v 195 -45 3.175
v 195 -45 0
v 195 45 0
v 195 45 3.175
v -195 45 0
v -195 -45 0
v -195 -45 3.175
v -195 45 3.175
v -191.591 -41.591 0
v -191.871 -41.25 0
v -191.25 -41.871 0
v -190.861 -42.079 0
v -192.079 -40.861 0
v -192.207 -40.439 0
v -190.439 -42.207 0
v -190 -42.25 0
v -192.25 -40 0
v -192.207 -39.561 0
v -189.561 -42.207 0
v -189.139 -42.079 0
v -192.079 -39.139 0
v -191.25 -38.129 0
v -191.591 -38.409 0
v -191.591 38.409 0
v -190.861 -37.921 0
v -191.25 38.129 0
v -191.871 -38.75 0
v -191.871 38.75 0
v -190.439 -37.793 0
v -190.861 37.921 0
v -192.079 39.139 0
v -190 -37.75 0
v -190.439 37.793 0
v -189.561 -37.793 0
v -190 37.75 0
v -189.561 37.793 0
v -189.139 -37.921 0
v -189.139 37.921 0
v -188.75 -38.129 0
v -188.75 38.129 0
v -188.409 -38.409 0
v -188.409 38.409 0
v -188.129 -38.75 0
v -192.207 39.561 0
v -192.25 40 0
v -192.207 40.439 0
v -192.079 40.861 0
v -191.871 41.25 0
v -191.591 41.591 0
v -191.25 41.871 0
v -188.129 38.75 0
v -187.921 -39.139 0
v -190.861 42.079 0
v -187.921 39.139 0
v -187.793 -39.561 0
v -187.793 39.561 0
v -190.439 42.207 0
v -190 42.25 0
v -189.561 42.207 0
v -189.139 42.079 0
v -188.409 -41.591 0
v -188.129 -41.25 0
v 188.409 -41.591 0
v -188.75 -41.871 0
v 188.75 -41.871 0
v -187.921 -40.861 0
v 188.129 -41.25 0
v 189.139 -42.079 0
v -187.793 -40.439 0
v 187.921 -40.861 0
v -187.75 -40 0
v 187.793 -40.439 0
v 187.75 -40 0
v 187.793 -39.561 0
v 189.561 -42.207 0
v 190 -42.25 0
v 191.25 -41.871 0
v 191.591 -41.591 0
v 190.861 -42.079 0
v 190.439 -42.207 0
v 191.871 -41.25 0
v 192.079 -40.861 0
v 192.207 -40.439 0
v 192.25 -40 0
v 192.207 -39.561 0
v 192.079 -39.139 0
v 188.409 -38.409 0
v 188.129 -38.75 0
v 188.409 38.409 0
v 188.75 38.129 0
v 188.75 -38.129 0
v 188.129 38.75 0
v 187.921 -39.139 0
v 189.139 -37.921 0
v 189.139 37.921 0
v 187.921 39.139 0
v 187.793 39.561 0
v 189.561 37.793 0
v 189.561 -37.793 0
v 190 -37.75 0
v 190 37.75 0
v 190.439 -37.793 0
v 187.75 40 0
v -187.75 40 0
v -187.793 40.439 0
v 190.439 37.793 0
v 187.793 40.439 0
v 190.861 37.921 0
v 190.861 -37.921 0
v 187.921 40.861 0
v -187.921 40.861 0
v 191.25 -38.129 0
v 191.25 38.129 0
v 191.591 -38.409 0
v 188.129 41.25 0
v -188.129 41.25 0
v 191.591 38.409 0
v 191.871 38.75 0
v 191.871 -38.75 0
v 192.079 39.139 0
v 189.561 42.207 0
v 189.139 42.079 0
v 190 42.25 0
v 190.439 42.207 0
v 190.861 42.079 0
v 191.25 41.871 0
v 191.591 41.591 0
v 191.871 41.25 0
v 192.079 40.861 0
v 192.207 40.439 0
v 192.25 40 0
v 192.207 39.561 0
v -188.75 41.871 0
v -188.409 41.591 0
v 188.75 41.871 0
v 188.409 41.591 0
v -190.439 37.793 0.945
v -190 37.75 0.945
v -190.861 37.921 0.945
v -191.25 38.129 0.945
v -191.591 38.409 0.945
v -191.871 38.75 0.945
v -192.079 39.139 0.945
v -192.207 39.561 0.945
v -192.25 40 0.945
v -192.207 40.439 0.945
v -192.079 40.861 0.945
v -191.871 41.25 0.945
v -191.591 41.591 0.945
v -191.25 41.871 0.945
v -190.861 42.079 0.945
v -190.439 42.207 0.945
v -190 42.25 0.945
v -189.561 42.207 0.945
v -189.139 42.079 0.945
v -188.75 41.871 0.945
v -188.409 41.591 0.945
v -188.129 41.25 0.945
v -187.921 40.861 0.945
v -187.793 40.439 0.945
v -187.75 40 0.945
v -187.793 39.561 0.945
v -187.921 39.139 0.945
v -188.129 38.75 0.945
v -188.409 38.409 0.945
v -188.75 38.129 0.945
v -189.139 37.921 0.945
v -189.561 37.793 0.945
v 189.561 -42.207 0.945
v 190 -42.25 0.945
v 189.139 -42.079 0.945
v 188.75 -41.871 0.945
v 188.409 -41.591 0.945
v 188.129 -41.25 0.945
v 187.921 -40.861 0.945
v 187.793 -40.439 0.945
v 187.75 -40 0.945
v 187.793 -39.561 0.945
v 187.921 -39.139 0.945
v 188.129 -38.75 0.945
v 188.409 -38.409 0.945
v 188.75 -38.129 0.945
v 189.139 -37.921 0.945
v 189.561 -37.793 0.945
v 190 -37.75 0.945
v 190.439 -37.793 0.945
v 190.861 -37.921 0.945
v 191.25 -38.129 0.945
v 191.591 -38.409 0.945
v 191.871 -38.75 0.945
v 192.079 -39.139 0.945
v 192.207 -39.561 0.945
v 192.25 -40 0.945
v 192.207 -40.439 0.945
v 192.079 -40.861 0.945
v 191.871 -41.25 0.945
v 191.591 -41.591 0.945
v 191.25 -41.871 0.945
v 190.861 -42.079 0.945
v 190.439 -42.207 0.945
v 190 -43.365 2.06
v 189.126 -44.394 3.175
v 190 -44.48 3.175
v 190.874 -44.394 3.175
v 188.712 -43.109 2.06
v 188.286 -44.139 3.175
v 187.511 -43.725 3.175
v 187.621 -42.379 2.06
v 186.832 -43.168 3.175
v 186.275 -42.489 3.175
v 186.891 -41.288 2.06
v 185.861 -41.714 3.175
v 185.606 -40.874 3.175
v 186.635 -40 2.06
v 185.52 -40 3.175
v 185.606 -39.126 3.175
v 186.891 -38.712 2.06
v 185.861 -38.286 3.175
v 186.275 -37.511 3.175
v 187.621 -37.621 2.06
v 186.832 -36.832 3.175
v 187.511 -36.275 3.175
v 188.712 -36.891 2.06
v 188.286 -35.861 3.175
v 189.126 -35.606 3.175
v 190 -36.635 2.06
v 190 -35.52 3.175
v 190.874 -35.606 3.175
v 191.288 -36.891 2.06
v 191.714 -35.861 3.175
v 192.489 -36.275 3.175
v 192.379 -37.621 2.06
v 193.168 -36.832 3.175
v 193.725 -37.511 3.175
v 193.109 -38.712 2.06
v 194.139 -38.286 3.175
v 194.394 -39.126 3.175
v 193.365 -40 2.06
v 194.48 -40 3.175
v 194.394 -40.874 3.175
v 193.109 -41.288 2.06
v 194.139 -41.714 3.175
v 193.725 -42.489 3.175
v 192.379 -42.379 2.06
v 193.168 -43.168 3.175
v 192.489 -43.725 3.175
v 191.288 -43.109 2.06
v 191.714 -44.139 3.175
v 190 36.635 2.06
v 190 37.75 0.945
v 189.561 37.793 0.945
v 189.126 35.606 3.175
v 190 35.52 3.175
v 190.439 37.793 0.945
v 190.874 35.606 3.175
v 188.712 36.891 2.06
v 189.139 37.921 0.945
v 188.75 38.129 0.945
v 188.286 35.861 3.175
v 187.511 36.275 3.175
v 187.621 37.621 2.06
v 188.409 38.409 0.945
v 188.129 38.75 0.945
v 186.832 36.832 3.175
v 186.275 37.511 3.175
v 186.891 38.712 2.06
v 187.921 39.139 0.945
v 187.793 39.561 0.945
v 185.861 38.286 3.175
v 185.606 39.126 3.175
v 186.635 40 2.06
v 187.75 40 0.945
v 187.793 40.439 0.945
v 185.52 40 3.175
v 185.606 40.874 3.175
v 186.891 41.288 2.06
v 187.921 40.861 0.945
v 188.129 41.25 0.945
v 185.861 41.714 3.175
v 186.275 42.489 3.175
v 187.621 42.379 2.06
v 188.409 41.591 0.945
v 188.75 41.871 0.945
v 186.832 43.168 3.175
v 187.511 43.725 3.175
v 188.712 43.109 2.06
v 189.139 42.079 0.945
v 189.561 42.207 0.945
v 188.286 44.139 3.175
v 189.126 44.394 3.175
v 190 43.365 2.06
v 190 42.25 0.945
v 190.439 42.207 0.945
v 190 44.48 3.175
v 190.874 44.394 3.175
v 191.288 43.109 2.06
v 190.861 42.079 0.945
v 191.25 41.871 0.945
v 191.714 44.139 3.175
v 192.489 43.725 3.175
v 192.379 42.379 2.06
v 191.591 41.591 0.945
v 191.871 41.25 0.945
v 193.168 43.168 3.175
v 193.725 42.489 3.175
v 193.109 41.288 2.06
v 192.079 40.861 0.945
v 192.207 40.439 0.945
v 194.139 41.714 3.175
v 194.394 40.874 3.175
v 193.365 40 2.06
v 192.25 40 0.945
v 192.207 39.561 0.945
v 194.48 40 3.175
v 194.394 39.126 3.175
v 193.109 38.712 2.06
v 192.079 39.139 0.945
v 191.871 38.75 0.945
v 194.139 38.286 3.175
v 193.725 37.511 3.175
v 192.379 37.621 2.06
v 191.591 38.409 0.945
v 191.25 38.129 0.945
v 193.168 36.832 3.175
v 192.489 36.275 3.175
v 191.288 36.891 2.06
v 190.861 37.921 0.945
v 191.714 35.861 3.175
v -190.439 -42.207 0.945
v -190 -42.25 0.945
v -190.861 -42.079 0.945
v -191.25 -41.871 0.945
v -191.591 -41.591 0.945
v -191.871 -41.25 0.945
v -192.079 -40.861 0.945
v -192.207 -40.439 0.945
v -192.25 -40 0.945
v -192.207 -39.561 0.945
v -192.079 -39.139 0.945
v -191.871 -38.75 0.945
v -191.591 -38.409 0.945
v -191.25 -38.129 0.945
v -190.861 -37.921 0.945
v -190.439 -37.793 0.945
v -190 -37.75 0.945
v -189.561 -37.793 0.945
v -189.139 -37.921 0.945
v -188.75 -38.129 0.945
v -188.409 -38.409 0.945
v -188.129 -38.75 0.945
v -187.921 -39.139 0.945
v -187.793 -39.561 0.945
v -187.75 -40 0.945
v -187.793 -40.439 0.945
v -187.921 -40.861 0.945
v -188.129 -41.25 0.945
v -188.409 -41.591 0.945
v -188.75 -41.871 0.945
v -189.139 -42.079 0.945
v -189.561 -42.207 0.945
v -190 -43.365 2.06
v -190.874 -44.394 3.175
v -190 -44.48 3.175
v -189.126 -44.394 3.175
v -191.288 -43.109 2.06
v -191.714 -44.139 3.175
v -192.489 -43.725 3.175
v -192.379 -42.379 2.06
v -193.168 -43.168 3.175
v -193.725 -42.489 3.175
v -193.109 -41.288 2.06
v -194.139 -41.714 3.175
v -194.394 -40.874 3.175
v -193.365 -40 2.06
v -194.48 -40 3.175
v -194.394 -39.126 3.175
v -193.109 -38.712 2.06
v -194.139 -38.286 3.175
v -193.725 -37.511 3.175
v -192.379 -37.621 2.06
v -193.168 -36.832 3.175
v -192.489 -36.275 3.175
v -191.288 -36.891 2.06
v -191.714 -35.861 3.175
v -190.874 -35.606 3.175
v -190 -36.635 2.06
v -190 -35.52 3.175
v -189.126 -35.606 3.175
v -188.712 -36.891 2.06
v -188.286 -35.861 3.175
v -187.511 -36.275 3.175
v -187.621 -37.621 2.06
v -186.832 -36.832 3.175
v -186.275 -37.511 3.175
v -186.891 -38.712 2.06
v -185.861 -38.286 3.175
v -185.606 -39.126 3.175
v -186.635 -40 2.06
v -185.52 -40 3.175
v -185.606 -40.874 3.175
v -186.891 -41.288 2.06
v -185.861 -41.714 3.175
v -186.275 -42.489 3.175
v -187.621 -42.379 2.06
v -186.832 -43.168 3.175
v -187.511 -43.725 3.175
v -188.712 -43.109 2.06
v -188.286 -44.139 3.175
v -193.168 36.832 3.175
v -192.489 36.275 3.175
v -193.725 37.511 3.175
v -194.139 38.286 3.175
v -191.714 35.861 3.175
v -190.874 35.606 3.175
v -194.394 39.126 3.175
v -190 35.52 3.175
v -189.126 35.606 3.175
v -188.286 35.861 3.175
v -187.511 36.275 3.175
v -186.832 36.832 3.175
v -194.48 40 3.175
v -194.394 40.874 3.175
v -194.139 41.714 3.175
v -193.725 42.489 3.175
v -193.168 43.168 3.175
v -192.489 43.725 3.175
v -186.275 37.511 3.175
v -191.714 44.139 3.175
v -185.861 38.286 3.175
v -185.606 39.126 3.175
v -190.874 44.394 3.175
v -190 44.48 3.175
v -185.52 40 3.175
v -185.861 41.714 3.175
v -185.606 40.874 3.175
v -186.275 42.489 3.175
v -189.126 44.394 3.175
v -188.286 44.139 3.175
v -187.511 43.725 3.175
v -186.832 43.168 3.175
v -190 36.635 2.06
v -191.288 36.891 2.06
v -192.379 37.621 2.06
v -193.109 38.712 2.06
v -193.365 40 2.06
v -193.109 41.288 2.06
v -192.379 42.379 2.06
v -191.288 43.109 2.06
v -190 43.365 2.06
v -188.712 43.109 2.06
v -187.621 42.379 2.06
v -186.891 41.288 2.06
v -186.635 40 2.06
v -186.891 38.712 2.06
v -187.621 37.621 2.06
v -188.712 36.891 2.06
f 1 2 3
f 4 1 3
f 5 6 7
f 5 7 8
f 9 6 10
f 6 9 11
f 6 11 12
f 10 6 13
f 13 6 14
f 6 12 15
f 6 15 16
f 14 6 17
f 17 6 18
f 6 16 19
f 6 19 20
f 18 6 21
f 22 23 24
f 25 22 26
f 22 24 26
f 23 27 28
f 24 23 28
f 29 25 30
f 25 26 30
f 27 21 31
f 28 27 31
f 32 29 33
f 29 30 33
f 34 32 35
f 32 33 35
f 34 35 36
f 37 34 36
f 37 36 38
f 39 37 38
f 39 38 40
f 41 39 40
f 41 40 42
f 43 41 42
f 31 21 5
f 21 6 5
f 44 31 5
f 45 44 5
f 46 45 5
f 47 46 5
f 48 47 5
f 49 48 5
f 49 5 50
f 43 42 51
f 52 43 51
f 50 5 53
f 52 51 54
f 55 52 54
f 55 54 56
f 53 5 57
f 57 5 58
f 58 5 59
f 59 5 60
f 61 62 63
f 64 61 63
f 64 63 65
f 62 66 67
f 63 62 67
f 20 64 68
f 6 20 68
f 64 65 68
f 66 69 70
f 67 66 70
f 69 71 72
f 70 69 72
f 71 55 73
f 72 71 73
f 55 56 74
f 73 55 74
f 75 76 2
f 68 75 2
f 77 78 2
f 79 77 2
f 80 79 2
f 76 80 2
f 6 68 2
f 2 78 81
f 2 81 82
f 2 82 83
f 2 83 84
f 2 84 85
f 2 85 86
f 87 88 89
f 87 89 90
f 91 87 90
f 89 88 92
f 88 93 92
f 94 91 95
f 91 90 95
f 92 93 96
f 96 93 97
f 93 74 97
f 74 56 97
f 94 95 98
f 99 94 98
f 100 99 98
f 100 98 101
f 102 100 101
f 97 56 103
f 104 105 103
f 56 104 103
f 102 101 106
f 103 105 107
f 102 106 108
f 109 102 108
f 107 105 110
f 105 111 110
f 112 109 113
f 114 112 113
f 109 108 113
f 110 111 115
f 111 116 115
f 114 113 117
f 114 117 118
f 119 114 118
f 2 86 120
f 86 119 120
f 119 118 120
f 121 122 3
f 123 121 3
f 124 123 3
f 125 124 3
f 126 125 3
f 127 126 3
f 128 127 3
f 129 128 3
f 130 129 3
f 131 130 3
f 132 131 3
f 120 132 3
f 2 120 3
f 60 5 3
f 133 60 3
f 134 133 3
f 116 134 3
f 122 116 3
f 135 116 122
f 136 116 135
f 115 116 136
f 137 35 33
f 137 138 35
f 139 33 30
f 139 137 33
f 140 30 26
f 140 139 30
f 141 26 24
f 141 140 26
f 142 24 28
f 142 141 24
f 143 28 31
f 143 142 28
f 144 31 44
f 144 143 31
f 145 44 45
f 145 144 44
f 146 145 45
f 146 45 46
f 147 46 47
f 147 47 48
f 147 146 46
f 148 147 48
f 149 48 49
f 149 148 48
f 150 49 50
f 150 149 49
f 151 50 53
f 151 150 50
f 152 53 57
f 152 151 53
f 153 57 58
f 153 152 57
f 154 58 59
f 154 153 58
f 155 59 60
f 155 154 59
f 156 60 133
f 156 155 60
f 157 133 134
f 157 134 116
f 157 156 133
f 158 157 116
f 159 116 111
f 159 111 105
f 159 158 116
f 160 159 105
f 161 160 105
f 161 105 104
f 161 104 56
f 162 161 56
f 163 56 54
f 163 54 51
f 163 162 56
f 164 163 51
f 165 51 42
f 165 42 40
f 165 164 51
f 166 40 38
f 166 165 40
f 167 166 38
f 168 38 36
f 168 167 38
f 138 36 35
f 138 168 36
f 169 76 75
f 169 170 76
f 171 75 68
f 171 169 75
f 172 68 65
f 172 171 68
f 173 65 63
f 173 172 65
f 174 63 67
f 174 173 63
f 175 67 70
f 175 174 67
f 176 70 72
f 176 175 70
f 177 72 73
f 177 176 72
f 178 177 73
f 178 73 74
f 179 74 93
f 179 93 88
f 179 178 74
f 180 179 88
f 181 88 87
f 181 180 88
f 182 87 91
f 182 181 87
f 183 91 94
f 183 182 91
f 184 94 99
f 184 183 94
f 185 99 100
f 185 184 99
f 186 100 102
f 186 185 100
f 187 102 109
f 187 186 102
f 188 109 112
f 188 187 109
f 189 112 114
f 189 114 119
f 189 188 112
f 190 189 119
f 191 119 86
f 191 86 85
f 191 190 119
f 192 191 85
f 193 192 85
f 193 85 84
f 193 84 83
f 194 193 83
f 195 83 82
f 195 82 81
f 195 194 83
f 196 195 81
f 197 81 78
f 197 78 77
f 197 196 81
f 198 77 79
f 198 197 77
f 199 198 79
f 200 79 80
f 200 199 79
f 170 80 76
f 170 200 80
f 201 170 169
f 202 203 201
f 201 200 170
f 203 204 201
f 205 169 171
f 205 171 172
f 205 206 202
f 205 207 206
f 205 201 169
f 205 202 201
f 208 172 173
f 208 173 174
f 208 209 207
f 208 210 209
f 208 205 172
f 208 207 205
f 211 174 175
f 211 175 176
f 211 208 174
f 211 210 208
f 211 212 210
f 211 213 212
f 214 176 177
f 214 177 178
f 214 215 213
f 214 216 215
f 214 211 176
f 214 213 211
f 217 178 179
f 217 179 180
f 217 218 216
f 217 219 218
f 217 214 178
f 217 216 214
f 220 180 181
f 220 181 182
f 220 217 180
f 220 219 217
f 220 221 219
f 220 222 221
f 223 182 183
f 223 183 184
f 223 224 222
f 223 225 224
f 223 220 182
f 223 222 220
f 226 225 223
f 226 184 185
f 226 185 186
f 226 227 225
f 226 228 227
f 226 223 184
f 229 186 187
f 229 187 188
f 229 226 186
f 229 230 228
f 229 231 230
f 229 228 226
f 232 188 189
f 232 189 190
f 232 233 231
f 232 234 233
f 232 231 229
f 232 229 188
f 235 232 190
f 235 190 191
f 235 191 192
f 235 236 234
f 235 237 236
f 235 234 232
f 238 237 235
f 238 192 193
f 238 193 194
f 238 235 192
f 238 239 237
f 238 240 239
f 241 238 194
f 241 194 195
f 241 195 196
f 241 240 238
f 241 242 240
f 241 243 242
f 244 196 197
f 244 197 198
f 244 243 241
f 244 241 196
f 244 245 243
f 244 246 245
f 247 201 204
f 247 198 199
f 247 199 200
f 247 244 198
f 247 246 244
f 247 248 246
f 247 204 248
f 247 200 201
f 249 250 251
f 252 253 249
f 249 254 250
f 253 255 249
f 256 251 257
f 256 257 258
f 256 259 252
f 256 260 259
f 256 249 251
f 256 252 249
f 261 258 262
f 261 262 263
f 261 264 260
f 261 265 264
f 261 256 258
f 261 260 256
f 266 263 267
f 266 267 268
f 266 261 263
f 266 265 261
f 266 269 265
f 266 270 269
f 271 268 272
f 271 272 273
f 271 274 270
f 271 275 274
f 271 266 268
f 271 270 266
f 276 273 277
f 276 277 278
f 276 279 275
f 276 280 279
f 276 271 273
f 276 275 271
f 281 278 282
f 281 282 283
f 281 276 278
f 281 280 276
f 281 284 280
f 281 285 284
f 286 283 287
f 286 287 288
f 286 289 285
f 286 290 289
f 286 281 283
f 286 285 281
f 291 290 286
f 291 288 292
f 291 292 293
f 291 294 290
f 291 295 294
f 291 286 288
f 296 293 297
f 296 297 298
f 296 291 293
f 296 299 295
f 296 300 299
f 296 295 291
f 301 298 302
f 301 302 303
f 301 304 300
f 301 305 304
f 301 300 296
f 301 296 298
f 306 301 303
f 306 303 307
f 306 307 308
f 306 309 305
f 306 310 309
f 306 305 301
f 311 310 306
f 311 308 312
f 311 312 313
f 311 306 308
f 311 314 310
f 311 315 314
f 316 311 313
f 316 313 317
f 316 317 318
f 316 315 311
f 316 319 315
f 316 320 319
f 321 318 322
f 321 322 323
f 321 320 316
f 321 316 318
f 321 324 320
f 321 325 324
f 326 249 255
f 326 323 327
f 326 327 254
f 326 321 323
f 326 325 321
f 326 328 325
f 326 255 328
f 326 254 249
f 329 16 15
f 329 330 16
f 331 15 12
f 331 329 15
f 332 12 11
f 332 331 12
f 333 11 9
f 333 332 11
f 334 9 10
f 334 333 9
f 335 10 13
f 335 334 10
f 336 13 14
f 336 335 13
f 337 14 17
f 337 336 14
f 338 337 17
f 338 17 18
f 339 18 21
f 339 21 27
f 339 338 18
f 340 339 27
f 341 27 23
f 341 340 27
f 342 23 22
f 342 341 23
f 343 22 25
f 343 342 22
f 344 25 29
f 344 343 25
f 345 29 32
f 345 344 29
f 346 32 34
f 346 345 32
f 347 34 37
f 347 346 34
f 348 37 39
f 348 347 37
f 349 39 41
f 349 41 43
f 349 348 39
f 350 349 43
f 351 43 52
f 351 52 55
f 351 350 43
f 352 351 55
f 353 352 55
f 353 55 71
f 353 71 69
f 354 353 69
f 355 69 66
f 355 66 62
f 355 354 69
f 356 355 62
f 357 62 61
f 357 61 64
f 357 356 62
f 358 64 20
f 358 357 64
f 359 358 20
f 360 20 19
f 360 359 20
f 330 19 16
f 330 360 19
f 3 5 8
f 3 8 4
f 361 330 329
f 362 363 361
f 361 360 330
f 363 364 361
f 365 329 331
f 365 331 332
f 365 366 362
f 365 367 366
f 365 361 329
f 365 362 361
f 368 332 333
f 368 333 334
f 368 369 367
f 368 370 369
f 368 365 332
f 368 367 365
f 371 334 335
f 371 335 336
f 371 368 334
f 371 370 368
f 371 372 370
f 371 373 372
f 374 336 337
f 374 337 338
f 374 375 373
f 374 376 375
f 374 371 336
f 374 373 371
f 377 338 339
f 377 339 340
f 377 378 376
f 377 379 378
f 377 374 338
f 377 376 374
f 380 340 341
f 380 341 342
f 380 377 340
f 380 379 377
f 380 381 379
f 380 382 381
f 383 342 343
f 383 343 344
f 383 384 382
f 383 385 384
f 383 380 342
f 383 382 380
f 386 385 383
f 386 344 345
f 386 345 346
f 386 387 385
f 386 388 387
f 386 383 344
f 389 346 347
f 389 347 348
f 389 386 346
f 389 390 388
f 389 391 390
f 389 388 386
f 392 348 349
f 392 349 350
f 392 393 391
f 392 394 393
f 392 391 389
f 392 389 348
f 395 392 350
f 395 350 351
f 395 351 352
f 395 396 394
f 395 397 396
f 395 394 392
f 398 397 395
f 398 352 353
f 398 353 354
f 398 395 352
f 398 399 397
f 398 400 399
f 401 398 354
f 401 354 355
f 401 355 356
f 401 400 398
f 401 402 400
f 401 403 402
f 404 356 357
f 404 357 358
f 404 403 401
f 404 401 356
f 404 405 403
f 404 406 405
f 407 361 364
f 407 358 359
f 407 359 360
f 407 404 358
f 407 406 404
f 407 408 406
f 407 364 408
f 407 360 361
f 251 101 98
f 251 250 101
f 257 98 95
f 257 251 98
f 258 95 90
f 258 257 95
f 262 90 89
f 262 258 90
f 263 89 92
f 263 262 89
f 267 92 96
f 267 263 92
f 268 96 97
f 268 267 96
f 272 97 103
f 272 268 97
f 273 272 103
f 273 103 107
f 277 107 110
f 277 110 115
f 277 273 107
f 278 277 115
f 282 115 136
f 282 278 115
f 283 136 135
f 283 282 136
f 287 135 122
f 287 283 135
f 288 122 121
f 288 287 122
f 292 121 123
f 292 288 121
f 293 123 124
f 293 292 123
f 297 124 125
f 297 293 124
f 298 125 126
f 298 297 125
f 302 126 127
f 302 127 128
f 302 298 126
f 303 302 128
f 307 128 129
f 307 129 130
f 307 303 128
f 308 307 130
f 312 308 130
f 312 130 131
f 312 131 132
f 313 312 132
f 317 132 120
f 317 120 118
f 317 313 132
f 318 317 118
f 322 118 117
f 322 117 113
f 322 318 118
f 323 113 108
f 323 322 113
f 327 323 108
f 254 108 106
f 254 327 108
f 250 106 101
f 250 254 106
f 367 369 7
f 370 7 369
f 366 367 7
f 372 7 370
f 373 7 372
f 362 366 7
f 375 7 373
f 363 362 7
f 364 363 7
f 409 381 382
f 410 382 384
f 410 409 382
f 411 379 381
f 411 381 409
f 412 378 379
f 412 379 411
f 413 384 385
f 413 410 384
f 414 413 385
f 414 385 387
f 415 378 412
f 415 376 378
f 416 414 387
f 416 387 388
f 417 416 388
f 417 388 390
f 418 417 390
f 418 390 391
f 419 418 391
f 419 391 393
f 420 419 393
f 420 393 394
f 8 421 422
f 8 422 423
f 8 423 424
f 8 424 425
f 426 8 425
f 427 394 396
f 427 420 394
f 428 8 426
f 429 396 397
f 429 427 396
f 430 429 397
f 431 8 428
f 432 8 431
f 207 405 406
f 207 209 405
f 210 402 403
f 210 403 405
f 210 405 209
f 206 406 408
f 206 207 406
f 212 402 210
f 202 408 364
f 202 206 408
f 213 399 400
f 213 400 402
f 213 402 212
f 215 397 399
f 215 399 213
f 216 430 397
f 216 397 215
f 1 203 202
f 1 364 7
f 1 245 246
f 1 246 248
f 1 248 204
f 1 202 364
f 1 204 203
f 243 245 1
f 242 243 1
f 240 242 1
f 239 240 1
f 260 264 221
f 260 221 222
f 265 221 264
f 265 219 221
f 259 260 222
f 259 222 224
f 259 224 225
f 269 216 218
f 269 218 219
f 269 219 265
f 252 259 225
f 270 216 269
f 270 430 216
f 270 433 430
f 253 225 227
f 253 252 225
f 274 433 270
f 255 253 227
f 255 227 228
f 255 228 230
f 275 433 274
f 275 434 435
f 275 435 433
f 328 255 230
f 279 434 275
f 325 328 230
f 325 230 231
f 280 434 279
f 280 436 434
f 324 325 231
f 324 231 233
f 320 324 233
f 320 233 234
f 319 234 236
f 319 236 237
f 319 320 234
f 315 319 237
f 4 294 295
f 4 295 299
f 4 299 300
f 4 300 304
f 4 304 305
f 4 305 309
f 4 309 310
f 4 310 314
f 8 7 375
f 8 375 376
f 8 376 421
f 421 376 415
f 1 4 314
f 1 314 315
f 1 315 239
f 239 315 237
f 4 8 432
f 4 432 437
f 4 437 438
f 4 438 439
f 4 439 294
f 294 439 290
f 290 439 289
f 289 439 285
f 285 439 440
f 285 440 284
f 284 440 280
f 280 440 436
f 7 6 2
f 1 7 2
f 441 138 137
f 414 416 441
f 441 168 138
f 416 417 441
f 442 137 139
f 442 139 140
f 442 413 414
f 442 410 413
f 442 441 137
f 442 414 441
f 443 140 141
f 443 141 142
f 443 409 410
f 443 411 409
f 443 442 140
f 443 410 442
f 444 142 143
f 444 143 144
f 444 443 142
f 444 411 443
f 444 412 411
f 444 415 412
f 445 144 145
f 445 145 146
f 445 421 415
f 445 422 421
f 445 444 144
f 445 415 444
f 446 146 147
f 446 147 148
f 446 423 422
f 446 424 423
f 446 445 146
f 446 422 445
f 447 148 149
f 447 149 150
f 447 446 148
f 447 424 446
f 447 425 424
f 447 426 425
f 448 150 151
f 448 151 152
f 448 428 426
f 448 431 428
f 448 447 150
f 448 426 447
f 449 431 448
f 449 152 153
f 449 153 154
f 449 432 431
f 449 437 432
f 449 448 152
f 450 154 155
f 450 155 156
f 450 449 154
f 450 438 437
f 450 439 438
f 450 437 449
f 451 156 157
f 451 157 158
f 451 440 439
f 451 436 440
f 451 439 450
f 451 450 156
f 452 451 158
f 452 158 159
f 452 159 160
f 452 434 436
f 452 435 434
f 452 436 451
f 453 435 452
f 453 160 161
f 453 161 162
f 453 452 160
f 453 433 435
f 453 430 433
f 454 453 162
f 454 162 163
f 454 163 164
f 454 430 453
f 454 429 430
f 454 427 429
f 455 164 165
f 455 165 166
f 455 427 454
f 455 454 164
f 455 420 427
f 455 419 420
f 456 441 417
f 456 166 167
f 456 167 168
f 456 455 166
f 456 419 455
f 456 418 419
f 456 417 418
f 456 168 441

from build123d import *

# Parameters (mm, degrees)
SKETCH1_W                    = 390
SKETCH1_H                    = 90
BOSS_EXTRUDE1_DEPTH          = 3.175
CSK_FOR_M4_SFHCS1_AT_2_COUNT = 2
CSK_FOR_M4_SFHCS1_AT_2_PITCH = 388.329756779
CSK_FOR_M4_SFHCS1_AT_3_COUNT = 2
CSK_FOR_M4_SFHCS1_AT_3_PITCH = 380
CSK_FOR_M4_SFHCS1_AT_4_COUNT = 2
CSK_FOR_M4_SFHCS1_AT_4_PITCH = 80


with BuildPart() as part:
    # Sketch1 → Boss-Extrude1 (new body)
    with BuildSketch(Plane.XY):
        Rectangle(SKETCH1_W, SKETCH1_H)
    extrude(amount=BOSS_EXTRUDE1_DEPTH)

    # Sketch3 → CSK for M4 SFHCS1 (revolve, cut)
    with BuildSketch(Plane(origin=(190, 40, 3.175), x_dir=(0, -1, 0), z_dir=(1, 0, 0))):
        Polygon((0, 0), (0, 3.175), (2.25, 3.175), (2.25, 2.23), (4.48, 0), align=None)
    csk_for_m4_sfhcs1 = revolve(axis=Axis((190, 40, 9.525), (0, 0, -1)), mode=Mode.SUBTRACT)

    # CSK for M4 SFHCS1 at 2: CSK for M4 SFHCS1 ×2
    with Locations(*[Vector(-0.9785497849867489, -0.20601048104984204, 0) * (i * CSK_FOR_M4_SFHCS1_AT_2_PITCH) for i in range(1, CSK_FOR_M4_SFHCS1_AT_2_COUNT)]):
        add(csk_for_m4_sfhcs1, mode=Mode.SUBTRACT)

    # CSK for M4 SFHCS1 at 3: CSK for M4 SFHCS1 ×2
    with Locations(*[(-i * CSK_FOR_M4_SFHCS1_AT_3_PITCH, 0, 0) for i in range(1, CSK_FOR_M4_SFHCS1_AT_3_COUNT)]):
        add(csk_for_m4_sfhcs1, mode=Mode.SUBTRACT)

    # CSK for M4 SFHCS1 at 4: CSK for M4 SFHCS1 ×2
    with Locations(*[(0, -i * CSK_FOR_M4_SFHCS1_AT_4_PITCH, 0) for i in range(1, CSK_FOR_M4_SFHCS1_AT_4_COUNT)]):
        add(csk_for_m4_sfhcs1, mode=Mode.SUBTRACT)


solid = part.part
